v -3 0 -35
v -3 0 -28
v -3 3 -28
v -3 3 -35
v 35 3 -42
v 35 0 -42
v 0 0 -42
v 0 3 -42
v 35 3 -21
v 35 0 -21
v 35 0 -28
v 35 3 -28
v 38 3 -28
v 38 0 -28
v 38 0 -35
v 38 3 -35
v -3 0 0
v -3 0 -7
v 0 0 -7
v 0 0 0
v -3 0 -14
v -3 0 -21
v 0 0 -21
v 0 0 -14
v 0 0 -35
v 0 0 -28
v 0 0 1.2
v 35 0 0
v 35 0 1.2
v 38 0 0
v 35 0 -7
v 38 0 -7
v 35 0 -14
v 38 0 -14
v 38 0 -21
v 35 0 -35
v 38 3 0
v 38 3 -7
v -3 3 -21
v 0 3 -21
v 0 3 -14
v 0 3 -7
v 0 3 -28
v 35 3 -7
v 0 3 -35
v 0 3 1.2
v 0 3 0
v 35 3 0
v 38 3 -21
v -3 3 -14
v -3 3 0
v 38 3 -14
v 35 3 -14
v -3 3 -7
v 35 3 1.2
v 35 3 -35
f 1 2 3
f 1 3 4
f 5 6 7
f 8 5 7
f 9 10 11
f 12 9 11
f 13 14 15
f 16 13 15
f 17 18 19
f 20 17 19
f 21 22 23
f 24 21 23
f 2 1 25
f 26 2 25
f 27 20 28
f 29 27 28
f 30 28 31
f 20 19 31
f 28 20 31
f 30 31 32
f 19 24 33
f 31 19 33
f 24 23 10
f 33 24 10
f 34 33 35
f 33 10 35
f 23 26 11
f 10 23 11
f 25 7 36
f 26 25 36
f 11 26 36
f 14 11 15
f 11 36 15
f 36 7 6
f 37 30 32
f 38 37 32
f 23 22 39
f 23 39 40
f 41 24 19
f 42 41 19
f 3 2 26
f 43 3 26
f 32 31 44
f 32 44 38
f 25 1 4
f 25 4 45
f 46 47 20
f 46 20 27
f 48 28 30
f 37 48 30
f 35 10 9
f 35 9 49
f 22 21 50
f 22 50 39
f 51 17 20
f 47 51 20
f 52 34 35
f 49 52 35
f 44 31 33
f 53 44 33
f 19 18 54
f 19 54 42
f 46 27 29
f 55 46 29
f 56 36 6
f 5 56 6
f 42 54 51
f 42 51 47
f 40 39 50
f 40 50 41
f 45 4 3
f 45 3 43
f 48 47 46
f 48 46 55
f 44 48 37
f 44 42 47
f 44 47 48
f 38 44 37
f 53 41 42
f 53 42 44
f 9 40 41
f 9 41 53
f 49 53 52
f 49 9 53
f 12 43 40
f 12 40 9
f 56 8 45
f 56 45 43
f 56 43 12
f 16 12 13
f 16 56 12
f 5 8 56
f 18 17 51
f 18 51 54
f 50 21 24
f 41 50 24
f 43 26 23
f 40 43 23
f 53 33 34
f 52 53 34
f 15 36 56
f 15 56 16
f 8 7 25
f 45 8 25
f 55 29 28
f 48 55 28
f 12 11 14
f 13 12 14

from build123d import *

# Parameters (mm, degrees)
SKETCH1_W           = 3
SKETCH1_H           = 7
SKETCH1_W_2         = 35
SKETCH1_H_2         = 1.2
BOSS_EXTRUDE1_DEPTH = 3


with BuildPart() as part:
    # Sketch1 → Boss-Extrude1 (new body)
    with BuildSketch(Plane(origin=(0, 0, 0), x_dir=(1, 0, 0), z_dir=(0, 1, 0))):
        Polygon((35, 42), (17.5, 42), (17.5, 0), (35, 0), (35, 7), (35, 14), (35, 21), (35, 28), (35, 35), align=None)
        with Locations((36.5, 31.5)):
            Rectangle(SKETCH1_W, SKETCH1_H)
        with Locations((36.5, 17.5)):
            Rectangle(SKETCH1_W, SKETCH1_H)
        with Locations((36.5, 3.5)):
            Rectangle(SKETCH1_W, SKETCH1_H)
        Polygon((17.5, 0), (17.5, 42), (0, 42), (0, 35), (0, 28), (0, 21), (0, 14), (0, 7), (0, 0), align=None)
        with Locations((17.5, -0.6)):
            Rectangle(SKETCH1_W_2, SKETCH1_H_2)
        with Locations((-1.5, 3.5)):
            Rectangle(SKETCH1_W, SKETCH1_H)
        with Locations((-1.5, 17.5)):
            Rectangle(SKETCH1_W, SKETCH1_H)
        with Locations((-1.5, 31.5)):
            Rectangle(SKETCH1_W, SKETCH1_H)
    extrude(amount=BOSS_EXTRUDE1_DEPTH)


solid = part.part
